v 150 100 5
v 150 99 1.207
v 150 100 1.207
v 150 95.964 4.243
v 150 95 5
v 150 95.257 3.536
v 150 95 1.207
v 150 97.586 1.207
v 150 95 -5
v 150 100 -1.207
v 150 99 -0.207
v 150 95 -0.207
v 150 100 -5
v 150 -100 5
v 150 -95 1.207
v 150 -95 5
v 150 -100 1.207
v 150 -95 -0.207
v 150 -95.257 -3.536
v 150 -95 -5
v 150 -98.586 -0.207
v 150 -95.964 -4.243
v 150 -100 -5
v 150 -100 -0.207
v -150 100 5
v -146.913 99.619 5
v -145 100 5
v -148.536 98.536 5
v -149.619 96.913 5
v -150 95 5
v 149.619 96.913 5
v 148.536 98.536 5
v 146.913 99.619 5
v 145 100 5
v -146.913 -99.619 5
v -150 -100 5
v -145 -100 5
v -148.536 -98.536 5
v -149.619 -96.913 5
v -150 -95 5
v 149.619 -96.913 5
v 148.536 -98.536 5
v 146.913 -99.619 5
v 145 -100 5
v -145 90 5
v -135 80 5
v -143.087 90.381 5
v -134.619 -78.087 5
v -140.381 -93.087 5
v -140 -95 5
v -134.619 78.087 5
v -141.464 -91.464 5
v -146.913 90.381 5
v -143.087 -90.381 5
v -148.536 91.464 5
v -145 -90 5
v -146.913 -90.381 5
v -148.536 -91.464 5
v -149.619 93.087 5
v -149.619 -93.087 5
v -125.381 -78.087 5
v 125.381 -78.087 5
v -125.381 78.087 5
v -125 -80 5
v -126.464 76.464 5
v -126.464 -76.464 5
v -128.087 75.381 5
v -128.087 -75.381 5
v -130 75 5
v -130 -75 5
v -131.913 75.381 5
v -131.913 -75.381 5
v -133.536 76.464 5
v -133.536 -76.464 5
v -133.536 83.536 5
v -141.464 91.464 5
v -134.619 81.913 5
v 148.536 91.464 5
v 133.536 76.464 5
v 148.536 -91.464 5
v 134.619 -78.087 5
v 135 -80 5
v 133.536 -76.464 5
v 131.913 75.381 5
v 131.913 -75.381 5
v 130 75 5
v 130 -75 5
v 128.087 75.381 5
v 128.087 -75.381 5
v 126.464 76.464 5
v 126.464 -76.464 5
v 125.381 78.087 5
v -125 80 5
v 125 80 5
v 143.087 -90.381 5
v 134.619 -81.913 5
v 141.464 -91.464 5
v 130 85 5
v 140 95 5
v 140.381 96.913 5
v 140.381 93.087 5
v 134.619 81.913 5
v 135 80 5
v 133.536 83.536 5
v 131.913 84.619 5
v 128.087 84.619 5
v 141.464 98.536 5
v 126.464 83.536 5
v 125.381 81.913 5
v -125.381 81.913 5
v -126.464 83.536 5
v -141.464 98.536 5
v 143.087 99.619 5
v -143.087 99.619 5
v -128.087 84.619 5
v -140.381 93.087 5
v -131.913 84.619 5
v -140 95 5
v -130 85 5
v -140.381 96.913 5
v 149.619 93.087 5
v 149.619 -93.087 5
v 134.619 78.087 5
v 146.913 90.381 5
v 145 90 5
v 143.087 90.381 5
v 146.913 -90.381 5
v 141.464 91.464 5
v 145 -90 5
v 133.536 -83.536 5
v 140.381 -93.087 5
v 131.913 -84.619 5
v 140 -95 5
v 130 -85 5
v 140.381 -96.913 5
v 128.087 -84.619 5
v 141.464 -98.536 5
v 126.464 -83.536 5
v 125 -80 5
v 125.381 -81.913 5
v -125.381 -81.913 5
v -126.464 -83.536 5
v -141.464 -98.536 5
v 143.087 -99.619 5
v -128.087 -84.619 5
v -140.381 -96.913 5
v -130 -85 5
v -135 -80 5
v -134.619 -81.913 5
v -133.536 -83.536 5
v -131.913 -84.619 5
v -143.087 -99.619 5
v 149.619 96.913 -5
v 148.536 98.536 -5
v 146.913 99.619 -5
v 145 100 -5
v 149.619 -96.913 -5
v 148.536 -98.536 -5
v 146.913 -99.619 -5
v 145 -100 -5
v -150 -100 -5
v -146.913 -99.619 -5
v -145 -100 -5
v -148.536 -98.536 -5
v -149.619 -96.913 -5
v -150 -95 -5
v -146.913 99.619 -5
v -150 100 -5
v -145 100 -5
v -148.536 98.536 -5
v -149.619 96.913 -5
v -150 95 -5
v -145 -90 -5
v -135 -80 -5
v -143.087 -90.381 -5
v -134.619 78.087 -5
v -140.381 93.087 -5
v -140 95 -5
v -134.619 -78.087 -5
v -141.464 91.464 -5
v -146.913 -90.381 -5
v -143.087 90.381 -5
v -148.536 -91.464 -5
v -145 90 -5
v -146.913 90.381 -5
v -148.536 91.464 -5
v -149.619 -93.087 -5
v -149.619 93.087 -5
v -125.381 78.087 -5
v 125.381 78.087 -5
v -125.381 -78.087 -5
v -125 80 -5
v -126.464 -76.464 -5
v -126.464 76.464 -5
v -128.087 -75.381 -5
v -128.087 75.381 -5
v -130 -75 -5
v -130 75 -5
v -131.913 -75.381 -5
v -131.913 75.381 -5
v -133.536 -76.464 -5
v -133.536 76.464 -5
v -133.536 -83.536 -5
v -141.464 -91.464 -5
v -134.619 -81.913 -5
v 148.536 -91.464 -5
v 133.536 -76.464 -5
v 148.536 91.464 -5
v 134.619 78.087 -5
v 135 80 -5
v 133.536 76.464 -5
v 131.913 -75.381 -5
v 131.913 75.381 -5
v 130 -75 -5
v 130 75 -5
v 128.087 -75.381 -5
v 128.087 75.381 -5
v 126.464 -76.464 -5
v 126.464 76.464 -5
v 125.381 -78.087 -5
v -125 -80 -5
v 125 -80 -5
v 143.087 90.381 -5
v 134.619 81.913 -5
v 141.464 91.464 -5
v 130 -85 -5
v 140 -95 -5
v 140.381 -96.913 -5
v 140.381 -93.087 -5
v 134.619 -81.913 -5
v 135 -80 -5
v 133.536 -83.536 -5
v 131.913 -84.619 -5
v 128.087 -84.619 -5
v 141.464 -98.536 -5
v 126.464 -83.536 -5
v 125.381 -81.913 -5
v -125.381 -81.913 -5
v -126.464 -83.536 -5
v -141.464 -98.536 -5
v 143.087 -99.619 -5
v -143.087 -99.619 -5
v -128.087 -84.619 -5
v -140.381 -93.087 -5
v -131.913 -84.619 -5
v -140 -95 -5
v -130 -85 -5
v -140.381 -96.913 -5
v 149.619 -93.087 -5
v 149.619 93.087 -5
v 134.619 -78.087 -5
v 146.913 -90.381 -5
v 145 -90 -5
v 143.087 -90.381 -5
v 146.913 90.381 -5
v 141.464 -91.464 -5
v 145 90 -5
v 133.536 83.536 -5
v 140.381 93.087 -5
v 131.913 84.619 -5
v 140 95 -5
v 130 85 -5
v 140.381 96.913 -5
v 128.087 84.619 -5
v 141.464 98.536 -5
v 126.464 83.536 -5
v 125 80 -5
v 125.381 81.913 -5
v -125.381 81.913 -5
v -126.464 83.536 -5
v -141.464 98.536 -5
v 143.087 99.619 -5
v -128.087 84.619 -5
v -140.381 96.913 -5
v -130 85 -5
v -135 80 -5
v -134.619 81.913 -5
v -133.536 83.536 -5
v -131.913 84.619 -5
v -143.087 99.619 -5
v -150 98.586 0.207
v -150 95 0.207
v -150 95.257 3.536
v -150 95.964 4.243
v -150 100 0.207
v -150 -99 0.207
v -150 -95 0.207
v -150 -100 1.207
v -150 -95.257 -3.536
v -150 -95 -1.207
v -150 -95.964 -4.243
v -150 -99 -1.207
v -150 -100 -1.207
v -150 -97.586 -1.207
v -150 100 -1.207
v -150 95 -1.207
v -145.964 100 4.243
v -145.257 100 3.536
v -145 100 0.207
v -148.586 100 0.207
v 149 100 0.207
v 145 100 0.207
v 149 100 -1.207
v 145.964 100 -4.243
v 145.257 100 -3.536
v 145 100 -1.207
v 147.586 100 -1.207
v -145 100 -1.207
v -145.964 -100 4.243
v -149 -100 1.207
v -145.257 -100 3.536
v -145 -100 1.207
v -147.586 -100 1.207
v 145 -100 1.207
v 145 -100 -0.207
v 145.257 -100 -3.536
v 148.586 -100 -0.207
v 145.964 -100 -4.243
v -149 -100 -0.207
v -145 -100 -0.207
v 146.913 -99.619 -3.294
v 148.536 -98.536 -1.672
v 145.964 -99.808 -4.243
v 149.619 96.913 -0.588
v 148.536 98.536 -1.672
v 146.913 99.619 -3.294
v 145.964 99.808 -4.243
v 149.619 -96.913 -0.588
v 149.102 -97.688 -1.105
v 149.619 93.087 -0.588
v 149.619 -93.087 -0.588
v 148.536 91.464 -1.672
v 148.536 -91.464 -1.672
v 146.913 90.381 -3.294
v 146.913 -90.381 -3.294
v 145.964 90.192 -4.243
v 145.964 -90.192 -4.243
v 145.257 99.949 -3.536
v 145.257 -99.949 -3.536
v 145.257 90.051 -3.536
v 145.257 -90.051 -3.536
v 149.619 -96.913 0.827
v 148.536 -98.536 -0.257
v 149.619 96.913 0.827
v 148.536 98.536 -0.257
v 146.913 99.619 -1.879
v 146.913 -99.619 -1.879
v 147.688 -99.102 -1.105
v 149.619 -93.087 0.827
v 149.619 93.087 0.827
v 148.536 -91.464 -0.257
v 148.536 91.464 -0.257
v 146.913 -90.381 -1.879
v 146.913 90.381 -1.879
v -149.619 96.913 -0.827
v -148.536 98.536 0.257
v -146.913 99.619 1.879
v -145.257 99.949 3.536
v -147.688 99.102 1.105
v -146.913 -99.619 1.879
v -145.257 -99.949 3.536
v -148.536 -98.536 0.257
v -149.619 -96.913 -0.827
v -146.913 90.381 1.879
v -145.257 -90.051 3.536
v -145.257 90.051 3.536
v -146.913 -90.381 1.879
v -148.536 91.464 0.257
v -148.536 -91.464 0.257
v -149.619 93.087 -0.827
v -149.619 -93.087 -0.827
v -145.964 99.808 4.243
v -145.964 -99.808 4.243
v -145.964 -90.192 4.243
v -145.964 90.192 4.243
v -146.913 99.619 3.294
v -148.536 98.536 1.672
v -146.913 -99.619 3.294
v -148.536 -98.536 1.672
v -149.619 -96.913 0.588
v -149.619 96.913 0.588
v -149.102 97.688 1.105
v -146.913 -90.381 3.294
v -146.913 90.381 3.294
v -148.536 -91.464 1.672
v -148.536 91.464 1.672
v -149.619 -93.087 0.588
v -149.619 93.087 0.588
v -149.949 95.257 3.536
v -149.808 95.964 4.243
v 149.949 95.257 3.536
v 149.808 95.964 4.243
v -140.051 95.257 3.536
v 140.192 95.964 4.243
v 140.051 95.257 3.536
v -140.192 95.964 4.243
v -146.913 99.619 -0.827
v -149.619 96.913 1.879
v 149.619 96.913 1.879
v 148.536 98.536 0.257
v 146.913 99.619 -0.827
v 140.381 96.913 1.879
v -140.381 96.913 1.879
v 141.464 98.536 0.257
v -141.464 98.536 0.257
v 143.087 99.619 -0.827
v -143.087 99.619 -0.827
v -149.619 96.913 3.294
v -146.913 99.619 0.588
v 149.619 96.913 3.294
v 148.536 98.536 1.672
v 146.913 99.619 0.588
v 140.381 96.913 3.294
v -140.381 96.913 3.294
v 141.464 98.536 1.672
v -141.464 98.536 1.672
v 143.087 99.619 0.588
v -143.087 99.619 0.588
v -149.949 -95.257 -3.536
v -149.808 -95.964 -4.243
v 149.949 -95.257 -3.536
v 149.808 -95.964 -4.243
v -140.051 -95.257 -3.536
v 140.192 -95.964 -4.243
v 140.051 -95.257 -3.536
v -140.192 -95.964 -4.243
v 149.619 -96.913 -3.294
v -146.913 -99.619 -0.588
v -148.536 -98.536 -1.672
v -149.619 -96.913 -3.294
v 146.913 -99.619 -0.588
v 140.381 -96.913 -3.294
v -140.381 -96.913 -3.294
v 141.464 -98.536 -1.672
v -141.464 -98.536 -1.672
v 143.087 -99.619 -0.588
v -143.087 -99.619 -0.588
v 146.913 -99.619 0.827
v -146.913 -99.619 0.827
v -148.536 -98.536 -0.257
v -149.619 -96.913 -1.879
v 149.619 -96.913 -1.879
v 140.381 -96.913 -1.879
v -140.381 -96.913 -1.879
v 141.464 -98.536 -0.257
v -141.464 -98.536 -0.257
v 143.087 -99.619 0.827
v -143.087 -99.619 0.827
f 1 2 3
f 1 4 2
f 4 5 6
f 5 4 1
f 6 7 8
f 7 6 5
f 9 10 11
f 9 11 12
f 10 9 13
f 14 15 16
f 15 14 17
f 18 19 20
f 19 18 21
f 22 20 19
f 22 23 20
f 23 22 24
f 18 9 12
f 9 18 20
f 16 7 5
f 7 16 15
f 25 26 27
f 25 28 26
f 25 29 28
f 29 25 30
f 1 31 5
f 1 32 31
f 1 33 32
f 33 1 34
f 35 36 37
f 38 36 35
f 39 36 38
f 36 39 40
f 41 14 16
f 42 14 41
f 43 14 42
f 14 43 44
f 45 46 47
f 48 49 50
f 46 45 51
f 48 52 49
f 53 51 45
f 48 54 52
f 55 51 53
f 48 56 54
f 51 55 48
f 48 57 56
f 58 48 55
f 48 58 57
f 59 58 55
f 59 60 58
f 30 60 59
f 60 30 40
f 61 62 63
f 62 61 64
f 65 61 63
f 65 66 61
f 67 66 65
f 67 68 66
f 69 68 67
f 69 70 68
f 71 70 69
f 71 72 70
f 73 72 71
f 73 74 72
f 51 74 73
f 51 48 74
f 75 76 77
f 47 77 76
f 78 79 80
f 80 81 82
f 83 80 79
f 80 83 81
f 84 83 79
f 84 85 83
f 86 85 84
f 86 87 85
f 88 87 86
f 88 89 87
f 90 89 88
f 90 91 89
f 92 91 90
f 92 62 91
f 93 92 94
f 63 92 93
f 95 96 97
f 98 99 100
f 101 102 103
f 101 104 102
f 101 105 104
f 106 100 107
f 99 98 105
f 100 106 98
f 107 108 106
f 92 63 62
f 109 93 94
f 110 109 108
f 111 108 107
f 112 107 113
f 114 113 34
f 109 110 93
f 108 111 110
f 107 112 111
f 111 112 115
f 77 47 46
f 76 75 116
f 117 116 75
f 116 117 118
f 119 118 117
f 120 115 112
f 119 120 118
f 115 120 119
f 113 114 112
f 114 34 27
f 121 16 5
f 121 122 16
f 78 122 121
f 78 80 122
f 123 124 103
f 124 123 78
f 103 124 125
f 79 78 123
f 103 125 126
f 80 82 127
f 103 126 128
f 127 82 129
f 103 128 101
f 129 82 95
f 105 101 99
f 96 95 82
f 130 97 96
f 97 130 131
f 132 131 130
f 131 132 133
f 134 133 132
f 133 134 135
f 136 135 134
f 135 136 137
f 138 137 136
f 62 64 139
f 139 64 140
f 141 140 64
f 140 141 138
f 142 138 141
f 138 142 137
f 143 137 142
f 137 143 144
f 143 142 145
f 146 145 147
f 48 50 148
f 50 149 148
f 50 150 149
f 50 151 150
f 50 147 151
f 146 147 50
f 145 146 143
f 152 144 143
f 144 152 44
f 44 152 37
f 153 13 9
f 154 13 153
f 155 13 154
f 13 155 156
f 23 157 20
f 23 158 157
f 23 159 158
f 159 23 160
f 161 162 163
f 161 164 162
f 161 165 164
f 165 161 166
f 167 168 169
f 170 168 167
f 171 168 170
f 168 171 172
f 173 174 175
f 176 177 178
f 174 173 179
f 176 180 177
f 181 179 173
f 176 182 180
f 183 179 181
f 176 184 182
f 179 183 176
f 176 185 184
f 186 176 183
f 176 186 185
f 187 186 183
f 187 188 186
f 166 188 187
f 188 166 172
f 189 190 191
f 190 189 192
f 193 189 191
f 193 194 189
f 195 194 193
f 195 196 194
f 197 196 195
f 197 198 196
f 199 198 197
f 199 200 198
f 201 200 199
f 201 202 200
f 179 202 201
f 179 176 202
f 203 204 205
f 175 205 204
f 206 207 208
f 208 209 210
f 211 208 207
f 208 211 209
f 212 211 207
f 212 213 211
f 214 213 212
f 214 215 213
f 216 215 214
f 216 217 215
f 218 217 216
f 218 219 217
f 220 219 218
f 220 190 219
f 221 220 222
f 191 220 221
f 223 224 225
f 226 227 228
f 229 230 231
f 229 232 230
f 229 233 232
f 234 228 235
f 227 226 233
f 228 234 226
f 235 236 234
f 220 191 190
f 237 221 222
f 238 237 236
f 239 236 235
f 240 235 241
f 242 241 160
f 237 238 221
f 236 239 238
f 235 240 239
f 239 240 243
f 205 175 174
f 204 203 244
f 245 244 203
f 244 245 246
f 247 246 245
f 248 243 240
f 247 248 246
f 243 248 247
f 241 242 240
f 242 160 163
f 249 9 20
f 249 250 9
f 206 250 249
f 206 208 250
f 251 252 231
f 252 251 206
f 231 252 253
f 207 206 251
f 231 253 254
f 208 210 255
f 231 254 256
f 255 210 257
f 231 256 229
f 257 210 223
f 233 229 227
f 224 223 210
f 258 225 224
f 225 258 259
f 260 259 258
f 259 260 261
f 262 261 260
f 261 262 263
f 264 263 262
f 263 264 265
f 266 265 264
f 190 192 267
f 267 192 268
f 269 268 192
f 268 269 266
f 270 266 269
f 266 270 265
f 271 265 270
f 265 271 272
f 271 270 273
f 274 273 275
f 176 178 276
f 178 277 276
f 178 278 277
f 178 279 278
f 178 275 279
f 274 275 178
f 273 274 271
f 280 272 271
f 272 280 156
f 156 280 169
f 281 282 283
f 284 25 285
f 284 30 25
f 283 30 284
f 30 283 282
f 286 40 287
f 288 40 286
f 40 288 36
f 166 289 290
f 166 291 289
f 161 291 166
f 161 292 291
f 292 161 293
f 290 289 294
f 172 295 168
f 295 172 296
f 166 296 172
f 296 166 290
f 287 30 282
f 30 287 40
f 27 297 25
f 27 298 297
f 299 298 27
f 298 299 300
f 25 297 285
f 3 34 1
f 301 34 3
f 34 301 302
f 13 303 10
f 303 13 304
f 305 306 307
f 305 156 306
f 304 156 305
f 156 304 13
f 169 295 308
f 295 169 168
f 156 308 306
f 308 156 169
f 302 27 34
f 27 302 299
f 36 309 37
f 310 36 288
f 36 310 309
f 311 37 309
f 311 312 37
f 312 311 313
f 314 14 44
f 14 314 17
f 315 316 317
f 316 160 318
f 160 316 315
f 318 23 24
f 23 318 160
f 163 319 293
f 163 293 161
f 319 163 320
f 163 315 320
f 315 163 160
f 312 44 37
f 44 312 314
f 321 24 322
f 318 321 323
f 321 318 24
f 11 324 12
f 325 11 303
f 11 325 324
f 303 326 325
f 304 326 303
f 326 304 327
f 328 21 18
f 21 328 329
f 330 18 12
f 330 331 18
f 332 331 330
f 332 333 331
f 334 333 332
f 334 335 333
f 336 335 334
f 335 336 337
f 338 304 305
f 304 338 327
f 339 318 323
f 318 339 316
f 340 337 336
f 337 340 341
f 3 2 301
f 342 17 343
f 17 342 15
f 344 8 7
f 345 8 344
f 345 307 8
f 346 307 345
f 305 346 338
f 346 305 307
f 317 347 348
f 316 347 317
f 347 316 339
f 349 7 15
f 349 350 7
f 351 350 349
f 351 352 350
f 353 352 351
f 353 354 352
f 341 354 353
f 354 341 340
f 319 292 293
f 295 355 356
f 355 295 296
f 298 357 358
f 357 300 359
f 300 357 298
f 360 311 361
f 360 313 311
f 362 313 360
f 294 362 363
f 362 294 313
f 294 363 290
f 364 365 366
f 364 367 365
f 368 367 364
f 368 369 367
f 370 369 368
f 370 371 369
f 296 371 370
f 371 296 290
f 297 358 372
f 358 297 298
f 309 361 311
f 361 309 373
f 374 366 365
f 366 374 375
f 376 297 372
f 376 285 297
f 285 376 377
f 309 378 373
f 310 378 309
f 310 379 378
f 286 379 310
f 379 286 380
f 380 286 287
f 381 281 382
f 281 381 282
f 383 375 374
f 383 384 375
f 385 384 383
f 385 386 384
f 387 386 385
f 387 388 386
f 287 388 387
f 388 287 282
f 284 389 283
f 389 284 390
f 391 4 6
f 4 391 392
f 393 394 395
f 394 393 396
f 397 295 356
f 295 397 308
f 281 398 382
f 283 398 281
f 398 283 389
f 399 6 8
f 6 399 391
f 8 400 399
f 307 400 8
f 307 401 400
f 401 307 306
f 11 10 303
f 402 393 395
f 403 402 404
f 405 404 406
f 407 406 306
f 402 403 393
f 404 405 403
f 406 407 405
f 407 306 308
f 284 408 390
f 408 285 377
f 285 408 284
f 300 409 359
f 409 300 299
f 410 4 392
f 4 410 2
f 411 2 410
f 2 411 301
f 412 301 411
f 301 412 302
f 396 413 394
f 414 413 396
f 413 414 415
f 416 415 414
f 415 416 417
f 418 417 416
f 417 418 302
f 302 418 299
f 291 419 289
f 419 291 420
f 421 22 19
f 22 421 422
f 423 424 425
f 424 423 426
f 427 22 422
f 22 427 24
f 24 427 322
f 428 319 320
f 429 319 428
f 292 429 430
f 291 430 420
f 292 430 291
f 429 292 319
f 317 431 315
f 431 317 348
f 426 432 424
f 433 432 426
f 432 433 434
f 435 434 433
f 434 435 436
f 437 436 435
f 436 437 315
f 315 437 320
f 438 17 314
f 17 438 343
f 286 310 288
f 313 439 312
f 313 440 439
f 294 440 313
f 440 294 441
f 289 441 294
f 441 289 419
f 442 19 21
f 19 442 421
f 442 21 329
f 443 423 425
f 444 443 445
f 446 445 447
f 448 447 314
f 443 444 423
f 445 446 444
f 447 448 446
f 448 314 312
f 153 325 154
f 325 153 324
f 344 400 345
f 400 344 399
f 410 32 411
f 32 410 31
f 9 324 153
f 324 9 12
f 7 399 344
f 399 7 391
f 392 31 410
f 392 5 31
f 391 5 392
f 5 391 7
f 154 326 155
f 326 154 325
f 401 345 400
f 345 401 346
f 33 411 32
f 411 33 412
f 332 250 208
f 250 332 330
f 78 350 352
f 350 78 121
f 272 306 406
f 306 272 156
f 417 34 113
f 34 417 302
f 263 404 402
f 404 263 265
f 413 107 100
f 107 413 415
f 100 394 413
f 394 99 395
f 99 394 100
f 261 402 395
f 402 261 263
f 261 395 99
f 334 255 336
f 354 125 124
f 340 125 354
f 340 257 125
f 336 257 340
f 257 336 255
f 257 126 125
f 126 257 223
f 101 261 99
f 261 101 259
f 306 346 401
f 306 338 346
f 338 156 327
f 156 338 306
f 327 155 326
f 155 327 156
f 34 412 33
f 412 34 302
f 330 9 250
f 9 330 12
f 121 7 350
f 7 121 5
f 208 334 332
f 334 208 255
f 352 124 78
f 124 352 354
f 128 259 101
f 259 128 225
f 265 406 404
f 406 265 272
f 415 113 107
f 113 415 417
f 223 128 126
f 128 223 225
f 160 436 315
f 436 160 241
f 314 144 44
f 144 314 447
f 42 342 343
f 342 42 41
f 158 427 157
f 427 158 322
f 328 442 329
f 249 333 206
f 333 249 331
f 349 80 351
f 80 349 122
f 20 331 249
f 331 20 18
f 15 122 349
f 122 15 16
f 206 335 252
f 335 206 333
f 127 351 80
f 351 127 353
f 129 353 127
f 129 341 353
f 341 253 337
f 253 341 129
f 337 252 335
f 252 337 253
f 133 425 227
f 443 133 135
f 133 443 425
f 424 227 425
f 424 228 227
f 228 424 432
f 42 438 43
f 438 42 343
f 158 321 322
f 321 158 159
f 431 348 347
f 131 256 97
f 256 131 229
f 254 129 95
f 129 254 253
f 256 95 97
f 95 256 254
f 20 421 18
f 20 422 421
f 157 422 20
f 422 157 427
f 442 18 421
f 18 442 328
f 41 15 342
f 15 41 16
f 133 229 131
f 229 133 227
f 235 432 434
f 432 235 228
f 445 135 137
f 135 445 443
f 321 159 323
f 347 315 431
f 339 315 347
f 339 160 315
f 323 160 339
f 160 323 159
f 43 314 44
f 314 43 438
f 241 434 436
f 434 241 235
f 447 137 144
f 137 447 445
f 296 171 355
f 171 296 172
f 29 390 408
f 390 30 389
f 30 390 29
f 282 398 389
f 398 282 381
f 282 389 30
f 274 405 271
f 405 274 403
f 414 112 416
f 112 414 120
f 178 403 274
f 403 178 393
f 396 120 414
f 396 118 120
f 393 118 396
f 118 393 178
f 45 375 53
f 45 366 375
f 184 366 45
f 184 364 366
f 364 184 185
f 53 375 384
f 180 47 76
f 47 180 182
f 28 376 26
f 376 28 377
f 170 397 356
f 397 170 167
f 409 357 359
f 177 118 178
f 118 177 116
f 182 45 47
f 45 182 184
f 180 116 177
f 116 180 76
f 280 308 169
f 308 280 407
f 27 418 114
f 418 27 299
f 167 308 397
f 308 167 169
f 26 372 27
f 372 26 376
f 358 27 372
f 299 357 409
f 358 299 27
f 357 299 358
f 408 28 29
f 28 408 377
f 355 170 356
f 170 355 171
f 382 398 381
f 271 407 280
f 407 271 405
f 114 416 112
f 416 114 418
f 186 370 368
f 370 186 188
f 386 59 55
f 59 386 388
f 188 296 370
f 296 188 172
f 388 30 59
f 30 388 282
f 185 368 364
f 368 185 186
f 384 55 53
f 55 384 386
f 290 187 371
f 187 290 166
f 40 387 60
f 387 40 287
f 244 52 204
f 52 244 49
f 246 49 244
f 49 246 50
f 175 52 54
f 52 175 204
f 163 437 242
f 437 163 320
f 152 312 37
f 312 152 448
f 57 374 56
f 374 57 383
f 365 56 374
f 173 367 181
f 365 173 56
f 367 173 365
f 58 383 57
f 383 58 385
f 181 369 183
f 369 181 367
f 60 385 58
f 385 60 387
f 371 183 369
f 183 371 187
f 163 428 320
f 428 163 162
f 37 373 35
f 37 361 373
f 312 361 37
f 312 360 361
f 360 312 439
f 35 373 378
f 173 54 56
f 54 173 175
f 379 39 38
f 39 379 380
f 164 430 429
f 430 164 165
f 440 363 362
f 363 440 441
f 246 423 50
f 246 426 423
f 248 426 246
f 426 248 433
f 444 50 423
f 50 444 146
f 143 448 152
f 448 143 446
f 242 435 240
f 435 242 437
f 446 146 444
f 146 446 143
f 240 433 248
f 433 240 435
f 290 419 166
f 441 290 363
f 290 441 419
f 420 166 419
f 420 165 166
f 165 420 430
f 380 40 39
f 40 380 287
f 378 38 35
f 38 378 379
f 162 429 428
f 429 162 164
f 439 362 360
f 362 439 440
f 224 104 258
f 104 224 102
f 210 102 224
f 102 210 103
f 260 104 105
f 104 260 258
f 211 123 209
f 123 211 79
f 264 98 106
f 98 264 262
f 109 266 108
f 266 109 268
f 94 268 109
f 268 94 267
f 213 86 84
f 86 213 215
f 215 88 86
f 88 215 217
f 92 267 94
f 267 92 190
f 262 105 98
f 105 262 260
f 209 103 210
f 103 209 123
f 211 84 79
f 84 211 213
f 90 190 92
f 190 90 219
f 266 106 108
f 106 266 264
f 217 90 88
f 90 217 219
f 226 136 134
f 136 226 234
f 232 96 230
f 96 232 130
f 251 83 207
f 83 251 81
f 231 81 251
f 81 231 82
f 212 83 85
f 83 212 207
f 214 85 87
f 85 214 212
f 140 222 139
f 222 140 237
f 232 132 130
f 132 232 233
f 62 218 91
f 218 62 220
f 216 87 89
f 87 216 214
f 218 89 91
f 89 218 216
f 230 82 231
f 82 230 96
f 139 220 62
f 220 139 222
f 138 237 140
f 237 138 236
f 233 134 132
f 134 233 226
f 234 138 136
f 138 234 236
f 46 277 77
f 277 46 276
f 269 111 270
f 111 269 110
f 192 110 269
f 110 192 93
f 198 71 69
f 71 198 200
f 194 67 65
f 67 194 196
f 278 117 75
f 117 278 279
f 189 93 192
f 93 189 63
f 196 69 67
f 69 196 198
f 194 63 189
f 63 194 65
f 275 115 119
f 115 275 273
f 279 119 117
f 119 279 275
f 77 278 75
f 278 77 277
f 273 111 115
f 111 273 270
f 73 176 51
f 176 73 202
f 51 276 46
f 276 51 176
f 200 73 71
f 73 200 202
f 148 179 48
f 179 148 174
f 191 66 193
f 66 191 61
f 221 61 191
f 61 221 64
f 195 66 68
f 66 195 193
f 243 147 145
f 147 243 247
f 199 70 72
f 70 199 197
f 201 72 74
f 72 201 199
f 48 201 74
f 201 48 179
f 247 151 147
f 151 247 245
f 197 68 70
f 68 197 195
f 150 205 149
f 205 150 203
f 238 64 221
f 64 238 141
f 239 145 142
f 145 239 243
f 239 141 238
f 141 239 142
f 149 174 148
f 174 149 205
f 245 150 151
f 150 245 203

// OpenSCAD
// Parameters
plate_L = 300; //[150:600:1]
plate_W = 200; //[100:400:1]
plate_T = 10; //[5:20:1]
chamfer = 1; //[0.5:3:0.1]
corner_R = 5; //[2.5:15:0.5]
hole_d = 10; //[5:20:0.5]
hole_edge_offset = 20; //[10:60:1]
hole_overlap = 1; //[0.5:2:0.1]
chamfer_overlap = 0.5; //[0.2:2:0.1]

// Base Shapes
module plate_body() {
  cube([plate_L, plate_W, plate_T], center=true);
}

module edge_chamfer_wedge_x() {
  rotate([0, 45, 0])
    cube([chamfer, plate_W + 2*chamfer_overlap, plate_T + 2*chamfer_overlap], center=true);
}

module edge_chamfer_wedge_y() {
  rotate([45, 0, 0])
    cube([plate_L + 2*chamfer_overlap, chamfer, plate_T + 2*chamfer_overlap], center=true);
}

module corner_radius_cutter() {
  cylinder(r=corner_R, h=plate_T + 2*hole_overlap, center=true);
}

module mounting_hole_cutter() {
  cylinder(r=hole_d/2, h=plate_T + 2*hole_overlap, center=true);
}

// Operations
module edge_chamfer_pos_x() {
  translate([plate_L/2 - chamfer/2, 0, 0])
    edge_chamfer_wedge_x();
}

module edge_chamfer_neg_x() {
  translate([-(plate_L/2 - chamfer/2), 0, 0])
    edge_chamfer_wedge_x();
}

module edge_chamfer_pos_y() {
  translate([0, plate_W/2 - chamfer/2, 0])
    edge_chamfer_wedge_y();
}

module edge_chamfer_neg_y() {
  translate([0, -(plate_W/2 - chamfer/2), 0])
    edge_chamfer_wedge_y();
}

module corner_radius_pp() {
  translate([plate_L/2 - corner_R, plate_W/2 - corner_R, 0])
    corner_radius_cutter();
}

module corner_radius_pn() {
  translate([plate_L/2 - corner_R, -(plate_W/2 - corner_R), 0])
    corner_radius_cutter();
}

module corner_radius_np() {
  translate([-(plate_L/2 - corner_R), plate_W/2 - corner_R, 0])
    corner_radius_cutter();
}

module corner_radius_nn() {
  translate([-(plate_L/2 - corner_R), -(plate_W/2 - corner_R), 0])
    corner_radius_cutter();
}

module mounting_hole_pp() {
  translate([plate_L/2 - hole_edge_offset, plate_W/2 - hole_edge_offset, 0])
    mounting_hole_cutter();
}

module mounting_hole_pn() {
  translate([plate_L/2 - hole_edge_offset, -(plate_W/2 - hole_edge_offset), 0])
    mounting_hole_cutter();
}

module mounting_hole_np() {
  translate([-(plate_L/2 - hole_edge_offset), plate_W/2 - hole_edge_offset, 0])
    mounting_hole_cutter();
}

module mounting_hole_nn() {
  translate([-(plate_L/2 - hole_edge_offset), -(plate_W/2 - hole_edge_offset), 0])
    mounting_hole_cutter();
}

// Final Output
difference() {
  color("Silver") plate_body();
  edge_chamfer_pos_x();
  edge_chamfer_neg_x();
  edge_chamfer_pos_y();
  edge_chamfer_neg_y();
  corner_radius_pp();
  corner_radius_pn();
  corner_radius_np();
  corner_radius_nn();
  mounting_hole_pp();
  mounting_hole_pn();
  mounting_hole_np();
  mounting_hole_nn();
  // Engraved label and surface texture are ignored as per no-text/no-decoration rule
}
